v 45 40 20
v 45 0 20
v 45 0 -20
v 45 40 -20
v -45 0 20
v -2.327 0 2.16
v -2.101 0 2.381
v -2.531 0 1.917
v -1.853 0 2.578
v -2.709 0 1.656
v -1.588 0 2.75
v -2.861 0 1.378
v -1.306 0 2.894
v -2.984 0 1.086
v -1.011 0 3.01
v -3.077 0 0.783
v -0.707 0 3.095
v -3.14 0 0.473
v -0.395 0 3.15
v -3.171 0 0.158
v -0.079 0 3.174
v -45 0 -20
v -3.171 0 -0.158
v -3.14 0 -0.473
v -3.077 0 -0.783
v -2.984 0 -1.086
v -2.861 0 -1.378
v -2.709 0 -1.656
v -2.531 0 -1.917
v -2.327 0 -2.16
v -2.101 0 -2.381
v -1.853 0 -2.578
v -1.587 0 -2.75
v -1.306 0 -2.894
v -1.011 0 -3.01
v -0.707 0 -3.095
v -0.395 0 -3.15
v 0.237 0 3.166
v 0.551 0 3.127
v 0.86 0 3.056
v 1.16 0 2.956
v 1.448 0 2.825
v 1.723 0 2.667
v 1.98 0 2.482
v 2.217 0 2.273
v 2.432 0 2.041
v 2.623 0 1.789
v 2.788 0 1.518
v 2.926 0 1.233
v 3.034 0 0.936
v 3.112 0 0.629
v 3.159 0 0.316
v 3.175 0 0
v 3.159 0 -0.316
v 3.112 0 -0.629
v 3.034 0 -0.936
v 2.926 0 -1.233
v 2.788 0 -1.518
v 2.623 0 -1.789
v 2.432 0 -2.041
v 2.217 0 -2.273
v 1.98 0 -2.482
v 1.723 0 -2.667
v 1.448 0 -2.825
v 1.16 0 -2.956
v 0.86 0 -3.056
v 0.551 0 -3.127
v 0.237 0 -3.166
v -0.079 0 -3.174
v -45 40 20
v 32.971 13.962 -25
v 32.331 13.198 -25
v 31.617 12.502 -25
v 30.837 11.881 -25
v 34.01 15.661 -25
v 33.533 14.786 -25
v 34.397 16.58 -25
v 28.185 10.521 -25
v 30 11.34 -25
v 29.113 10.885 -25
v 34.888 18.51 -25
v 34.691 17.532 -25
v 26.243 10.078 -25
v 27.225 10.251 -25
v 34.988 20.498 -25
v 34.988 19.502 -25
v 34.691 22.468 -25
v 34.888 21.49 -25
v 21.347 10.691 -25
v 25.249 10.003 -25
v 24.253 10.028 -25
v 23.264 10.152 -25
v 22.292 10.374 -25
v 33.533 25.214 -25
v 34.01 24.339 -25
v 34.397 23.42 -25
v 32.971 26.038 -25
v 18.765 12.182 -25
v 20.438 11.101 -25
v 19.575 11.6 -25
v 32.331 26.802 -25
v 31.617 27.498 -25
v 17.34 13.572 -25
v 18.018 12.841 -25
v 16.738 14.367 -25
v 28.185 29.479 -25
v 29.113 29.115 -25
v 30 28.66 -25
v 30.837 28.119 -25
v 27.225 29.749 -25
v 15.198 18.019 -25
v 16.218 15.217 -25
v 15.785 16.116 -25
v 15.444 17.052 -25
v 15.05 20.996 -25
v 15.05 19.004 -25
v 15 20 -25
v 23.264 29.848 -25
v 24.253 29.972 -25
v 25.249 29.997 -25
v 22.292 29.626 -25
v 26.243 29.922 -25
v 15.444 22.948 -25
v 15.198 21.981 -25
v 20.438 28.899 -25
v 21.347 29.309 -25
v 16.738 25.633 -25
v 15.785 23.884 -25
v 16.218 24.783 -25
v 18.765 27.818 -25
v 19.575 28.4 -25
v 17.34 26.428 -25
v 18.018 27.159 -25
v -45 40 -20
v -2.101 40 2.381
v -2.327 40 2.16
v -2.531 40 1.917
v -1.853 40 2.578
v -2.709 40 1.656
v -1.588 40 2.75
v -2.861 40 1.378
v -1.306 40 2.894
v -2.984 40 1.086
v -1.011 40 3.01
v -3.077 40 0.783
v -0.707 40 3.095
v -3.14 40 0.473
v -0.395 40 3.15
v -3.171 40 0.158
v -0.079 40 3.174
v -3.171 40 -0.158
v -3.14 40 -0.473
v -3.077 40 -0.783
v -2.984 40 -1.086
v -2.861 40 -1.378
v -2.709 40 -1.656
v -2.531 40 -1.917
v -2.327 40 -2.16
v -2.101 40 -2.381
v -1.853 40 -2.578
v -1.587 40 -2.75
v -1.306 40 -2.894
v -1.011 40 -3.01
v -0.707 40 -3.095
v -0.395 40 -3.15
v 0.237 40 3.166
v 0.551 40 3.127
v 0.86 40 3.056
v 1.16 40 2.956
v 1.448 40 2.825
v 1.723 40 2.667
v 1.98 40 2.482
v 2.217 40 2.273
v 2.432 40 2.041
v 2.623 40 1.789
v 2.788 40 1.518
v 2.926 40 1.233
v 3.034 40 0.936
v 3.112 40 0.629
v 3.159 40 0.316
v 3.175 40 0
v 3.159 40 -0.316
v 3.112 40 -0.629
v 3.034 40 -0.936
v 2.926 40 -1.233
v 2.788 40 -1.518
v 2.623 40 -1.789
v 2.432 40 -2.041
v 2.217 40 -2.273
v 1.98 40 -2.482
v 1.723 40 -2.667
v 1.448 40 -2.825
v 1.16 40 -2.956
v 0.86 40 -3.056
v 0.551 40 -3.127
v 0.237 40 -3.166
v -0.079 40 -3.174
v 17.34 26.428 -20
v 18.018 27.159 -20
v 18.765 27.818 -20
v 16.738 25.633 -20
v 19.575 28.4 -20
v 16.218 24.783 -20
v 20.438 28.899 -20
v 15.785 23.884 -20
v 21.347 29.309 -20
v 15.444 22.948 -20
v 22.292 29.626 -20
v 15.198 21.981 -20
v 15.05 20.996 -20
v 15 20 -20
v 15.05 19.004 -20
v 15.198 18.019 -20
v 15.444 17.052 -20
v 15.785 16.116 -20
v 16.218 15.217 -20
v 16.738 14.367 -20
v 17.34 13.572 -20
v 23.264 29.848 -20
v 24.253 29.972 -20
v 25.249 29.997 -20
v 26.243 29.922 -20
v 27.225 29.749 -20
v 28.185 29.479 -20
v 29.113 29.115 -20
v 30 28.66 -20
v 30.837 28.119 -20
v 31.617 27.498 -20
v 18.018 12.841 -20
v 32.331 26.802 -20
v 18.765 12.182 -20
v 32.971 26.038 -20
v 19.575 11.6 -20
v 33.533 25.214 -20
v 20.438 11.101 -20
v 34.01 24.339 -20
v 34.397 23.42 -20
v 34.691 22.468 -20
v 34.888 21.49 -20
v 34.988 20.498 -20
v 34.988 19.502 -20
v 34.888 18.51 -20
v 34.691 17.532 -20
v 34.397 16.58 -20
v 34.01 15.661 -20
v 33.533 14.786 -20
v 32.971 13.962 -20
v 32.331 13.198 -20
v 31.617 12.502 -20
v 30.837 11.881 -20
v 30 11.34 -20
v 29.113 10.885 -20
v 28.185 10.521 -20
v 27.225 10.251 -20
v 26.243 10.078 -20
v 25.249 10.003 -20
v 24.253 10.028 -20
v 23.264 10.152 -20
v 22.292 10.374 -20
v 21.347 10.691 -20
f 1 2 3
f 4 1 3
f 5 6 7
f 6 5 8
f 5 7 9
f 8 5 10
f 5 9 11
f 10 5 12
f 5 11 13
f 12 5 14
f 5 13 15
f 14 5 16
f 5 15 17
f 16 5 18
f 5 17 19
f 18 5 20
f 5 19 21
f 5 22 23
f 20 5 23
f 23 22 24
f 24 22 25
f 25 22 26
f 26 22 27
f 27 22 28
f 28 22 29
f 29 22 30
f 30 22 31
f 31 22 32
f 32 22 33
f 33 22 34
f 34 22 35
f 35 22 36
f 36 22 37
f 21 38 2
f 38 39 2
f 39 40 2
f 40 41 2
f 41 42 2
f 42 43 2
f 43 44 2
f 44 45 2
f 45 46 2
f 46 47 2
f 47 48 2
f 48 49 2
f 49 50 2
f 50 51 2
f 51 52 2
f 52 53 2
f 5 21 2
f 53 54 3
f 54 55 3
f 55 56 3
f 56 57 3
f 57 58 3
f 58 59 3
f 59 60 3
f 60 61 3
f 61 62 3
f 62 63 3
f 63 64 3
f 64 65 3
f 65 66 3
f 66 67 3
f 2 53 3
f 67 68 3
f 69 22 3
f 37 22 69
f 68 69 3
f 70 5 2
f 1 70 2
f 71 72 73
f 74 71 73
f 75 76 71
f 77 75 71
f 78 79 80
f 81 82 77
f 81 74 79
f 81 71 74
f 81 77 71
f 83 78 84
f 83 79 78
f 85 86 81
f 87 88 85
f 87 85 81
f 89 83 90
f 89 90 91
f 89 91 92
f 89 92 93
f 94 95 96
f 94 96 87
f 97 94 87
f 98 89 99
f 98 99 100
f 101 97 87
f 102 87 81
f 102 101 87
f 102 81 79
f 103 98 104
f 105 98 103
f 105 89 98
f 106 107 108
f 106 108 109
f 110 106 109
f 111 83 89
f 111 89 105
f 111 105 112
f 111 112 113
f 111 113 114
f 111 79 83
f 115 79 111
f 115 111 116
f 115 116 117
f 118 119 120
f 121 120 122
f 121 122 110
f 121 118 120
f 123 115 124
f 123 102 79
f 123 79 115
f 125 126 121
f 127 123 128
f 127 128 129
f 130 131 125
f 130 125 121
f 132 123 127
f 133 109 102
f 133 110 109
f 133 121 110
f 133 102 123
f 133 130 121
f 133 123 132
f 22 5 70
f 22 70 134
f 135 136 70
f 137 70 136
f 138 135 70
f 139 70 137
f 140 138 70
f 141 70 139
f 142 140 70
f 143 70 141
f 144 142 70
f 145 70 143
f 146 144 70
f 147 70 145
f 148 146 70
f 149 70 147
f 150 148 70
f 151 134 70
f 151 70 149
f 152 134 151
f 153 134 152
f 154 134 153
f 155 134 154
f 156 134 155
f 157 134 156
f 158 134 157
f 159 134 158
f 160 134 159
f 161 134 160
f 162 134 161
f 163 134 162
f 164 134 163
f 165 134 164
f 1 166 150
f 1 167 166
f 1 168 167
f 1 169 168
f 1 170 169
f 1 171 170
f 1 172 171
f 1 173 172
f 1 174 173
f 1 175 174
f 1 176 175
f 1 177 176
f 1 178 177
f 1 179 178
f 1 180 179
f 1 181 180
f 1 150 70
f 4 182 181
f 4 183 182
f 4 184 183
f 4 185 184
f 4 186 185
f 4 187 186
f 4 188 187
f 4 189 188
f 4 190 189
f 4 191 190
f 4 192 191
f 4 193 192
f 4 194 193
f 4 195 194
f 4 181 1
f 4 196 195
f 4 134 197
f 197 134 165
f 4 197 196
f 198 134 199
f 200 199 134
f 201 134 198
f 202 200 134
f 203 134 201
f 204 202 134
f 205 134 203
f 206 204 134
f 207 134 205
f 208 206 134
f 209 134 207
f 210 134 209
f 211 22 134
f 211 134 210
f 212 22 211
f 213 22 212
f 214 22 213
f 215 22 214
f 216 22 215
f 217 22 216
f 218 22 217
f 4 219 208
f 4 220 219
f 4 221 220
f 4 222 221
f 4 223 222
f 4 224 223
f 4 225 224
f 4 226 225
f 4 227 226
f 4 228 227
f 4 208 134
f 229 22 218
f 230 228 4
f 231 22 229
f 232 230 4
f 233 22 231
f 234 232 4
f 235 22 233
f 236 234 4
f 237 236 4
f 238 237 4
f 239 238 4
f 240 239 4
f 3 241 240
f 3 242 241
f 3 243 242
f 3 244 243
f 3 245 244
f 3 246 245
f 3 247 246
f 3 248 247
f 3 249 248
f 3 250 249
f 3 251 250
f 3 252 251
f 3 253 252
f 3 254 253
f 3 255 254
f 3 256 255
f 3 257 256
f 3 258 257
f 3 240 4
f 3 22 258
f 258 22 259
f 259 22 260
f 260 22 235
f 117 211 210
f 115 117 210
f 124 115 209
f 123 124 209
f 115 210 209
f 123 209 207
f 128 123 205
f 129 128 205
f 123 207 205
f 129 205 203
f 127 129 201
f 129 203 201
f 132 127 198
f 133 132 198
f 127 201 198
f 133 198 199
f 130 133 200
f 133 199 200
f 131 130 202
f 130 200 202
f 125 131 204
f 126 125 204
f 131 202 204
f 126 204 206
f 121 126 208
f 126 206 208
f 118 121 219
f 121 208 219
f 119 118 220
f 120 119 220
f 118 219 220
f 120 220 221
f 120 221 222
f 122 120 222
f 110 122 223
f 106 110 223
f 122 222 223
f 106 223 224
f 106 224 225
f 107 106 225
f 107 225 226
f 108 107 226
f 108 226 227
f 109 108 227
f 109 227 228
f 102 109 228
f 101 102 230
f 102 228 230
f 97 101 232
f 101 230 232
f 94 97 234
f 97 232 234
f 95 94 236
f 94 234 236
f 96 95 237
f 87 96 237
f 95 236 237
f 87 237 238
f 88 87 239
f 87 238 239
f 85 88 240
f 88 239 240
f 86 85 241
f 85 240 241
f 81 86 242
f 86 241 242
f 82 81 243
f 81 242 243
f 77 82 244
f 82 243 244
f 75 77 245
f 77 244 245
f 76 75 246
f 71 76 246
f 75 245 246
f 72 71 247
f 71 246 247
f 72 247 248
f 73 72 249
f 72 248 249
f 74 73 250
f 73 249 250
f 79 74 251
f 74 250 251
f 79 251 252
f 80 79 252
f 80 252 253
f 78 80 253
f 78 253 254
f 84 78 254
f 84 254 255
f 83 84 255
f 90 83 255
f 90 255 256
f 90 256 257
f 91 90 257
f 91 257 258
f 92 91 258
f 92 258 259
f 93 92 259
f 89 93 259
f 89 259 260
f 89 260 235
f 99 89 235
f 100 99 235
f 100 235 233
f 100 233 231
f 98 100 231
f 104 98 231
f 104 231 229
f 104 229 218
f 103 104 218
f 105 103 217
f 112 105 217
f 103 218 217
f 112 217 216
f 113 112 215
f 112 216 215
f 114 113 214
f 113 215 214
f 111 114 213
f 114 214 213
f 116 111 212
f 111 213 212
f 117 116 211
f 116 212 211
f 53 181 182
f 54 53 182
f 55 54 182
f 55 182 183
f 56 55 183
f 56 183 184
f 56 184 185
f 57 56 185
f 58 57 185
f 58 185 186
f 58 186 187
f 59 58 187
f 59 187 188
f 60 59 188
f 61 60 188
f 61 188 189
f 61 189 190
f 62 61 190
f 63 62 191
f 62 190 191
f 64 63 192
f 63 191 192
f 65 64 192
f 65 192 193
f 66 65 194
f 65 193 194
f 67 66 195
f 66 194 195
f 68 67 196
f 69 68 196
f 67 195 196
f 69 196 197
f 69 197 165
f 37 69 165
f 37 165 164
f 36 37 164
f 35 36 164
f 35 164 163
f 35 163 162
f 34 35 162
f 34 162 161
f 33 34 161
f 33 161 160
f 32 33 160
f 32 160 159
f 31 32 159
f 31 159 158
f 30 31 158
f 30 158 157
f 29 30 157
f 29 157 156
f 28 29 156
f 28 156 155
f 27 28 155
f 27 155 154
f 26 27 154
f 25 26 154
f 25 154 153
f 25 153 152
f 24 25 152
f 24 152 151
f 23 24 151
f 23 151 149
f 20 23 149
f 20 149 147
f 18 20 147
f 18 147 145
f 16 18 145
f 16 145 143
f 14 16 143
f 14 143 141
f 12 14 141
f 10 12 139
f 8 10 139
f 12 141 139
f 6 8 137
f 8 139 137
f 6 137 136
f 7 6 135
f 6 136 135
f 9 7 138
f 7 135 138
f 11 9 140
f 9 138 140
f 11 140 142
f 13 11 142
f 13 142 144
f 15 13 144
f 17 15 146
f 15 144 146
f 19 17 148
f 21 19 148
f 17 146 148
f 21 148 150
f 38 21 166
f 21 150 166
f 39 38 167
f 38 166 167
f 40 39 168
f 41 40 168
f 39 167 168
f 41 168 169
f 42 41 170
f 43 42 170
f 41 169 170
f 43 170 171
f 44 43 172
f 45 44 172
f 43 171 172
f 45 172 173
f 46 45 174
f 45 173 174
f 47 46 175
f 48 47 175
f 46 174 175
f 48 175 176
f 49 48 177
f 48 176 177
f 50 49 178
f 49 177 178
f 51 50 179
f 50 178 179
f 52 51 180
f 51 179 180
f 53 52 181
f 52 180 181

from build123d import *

# Parameters (mm, degrees)
SKETCH1_W           = 90
SKETCH1_H           = 40
BOSS_EXTRUDE1_DEPTH = 40
SKETCH2_R           = 10
BOSS_EXTRUDE2_DEPTH = 5
SKETCH3_R           = 3.175
CUT_EXTRUDE1_DEPTH  = 41


with BuildPart() as part:
    # Sketch1 → Boss-Extrude1 (new body)
    with BuildSketch(Plane(origin=(0, 0, 0), x_dir=(1, 0, 0), z_dir=(0, 1, 0))):
        Rectangle(SKETCH1_W, SKETCH1_H)
    extrude(amount=BOSS_EXTRUDE1_DEPTH)

    # Sketch2 → Boss-Extrude2 (add)
    with BuildSketch(Plane(origin=(0, 0, -20), x_dir=(-1, 0, 0), z_dir=(0, 0, -1))):
        with Locations((-25, 20)):
            Circle(SKETCH2_R)
    extrude(amount=BOSS_EXTRUDE2_DEPTH)

    # Sketch3 → Cut-Extrude1 (cut, through all)
    with BuildSketch(Plane(origin=(0, 40, 0), x_dir=(1, 0, 0), z_dir=(0, 1, 0))):
        Circle(SKETCH3_R)
    extrude(amount=-CUT_EXTRUDE1_DEPTH, mode=Mode.SUBTRACT)


solid = part.part
